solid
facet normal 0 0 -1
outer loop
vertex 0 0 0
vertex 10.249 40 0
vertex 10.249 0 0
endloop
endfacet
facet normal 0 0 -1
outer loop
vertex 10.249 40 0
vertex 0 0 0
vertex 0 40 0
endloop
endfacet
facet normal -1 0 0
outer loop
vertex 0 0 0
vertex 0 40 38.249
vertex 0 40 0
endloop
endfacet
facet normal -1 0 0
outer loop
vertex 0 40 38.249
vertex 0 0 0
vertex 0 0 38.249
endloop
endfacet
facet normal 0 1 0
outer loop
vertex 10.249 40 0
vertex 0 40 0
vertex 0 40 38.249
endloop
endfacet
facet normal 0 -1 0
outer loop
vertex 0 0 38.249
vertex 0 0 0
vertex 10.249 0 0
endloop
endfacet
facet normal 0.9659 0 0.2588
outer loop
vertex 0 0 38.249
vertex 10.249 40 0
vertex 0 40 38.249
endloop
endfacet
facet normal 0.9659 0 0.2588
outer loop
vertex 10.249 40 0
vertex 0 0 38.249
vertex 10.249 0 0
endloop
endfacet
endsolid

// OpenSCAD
difference() {
	cube([40,40,40]);
	translate([14,0,-14])
		rotate([0,-15,0])
			cube([400,400,400]);
}
